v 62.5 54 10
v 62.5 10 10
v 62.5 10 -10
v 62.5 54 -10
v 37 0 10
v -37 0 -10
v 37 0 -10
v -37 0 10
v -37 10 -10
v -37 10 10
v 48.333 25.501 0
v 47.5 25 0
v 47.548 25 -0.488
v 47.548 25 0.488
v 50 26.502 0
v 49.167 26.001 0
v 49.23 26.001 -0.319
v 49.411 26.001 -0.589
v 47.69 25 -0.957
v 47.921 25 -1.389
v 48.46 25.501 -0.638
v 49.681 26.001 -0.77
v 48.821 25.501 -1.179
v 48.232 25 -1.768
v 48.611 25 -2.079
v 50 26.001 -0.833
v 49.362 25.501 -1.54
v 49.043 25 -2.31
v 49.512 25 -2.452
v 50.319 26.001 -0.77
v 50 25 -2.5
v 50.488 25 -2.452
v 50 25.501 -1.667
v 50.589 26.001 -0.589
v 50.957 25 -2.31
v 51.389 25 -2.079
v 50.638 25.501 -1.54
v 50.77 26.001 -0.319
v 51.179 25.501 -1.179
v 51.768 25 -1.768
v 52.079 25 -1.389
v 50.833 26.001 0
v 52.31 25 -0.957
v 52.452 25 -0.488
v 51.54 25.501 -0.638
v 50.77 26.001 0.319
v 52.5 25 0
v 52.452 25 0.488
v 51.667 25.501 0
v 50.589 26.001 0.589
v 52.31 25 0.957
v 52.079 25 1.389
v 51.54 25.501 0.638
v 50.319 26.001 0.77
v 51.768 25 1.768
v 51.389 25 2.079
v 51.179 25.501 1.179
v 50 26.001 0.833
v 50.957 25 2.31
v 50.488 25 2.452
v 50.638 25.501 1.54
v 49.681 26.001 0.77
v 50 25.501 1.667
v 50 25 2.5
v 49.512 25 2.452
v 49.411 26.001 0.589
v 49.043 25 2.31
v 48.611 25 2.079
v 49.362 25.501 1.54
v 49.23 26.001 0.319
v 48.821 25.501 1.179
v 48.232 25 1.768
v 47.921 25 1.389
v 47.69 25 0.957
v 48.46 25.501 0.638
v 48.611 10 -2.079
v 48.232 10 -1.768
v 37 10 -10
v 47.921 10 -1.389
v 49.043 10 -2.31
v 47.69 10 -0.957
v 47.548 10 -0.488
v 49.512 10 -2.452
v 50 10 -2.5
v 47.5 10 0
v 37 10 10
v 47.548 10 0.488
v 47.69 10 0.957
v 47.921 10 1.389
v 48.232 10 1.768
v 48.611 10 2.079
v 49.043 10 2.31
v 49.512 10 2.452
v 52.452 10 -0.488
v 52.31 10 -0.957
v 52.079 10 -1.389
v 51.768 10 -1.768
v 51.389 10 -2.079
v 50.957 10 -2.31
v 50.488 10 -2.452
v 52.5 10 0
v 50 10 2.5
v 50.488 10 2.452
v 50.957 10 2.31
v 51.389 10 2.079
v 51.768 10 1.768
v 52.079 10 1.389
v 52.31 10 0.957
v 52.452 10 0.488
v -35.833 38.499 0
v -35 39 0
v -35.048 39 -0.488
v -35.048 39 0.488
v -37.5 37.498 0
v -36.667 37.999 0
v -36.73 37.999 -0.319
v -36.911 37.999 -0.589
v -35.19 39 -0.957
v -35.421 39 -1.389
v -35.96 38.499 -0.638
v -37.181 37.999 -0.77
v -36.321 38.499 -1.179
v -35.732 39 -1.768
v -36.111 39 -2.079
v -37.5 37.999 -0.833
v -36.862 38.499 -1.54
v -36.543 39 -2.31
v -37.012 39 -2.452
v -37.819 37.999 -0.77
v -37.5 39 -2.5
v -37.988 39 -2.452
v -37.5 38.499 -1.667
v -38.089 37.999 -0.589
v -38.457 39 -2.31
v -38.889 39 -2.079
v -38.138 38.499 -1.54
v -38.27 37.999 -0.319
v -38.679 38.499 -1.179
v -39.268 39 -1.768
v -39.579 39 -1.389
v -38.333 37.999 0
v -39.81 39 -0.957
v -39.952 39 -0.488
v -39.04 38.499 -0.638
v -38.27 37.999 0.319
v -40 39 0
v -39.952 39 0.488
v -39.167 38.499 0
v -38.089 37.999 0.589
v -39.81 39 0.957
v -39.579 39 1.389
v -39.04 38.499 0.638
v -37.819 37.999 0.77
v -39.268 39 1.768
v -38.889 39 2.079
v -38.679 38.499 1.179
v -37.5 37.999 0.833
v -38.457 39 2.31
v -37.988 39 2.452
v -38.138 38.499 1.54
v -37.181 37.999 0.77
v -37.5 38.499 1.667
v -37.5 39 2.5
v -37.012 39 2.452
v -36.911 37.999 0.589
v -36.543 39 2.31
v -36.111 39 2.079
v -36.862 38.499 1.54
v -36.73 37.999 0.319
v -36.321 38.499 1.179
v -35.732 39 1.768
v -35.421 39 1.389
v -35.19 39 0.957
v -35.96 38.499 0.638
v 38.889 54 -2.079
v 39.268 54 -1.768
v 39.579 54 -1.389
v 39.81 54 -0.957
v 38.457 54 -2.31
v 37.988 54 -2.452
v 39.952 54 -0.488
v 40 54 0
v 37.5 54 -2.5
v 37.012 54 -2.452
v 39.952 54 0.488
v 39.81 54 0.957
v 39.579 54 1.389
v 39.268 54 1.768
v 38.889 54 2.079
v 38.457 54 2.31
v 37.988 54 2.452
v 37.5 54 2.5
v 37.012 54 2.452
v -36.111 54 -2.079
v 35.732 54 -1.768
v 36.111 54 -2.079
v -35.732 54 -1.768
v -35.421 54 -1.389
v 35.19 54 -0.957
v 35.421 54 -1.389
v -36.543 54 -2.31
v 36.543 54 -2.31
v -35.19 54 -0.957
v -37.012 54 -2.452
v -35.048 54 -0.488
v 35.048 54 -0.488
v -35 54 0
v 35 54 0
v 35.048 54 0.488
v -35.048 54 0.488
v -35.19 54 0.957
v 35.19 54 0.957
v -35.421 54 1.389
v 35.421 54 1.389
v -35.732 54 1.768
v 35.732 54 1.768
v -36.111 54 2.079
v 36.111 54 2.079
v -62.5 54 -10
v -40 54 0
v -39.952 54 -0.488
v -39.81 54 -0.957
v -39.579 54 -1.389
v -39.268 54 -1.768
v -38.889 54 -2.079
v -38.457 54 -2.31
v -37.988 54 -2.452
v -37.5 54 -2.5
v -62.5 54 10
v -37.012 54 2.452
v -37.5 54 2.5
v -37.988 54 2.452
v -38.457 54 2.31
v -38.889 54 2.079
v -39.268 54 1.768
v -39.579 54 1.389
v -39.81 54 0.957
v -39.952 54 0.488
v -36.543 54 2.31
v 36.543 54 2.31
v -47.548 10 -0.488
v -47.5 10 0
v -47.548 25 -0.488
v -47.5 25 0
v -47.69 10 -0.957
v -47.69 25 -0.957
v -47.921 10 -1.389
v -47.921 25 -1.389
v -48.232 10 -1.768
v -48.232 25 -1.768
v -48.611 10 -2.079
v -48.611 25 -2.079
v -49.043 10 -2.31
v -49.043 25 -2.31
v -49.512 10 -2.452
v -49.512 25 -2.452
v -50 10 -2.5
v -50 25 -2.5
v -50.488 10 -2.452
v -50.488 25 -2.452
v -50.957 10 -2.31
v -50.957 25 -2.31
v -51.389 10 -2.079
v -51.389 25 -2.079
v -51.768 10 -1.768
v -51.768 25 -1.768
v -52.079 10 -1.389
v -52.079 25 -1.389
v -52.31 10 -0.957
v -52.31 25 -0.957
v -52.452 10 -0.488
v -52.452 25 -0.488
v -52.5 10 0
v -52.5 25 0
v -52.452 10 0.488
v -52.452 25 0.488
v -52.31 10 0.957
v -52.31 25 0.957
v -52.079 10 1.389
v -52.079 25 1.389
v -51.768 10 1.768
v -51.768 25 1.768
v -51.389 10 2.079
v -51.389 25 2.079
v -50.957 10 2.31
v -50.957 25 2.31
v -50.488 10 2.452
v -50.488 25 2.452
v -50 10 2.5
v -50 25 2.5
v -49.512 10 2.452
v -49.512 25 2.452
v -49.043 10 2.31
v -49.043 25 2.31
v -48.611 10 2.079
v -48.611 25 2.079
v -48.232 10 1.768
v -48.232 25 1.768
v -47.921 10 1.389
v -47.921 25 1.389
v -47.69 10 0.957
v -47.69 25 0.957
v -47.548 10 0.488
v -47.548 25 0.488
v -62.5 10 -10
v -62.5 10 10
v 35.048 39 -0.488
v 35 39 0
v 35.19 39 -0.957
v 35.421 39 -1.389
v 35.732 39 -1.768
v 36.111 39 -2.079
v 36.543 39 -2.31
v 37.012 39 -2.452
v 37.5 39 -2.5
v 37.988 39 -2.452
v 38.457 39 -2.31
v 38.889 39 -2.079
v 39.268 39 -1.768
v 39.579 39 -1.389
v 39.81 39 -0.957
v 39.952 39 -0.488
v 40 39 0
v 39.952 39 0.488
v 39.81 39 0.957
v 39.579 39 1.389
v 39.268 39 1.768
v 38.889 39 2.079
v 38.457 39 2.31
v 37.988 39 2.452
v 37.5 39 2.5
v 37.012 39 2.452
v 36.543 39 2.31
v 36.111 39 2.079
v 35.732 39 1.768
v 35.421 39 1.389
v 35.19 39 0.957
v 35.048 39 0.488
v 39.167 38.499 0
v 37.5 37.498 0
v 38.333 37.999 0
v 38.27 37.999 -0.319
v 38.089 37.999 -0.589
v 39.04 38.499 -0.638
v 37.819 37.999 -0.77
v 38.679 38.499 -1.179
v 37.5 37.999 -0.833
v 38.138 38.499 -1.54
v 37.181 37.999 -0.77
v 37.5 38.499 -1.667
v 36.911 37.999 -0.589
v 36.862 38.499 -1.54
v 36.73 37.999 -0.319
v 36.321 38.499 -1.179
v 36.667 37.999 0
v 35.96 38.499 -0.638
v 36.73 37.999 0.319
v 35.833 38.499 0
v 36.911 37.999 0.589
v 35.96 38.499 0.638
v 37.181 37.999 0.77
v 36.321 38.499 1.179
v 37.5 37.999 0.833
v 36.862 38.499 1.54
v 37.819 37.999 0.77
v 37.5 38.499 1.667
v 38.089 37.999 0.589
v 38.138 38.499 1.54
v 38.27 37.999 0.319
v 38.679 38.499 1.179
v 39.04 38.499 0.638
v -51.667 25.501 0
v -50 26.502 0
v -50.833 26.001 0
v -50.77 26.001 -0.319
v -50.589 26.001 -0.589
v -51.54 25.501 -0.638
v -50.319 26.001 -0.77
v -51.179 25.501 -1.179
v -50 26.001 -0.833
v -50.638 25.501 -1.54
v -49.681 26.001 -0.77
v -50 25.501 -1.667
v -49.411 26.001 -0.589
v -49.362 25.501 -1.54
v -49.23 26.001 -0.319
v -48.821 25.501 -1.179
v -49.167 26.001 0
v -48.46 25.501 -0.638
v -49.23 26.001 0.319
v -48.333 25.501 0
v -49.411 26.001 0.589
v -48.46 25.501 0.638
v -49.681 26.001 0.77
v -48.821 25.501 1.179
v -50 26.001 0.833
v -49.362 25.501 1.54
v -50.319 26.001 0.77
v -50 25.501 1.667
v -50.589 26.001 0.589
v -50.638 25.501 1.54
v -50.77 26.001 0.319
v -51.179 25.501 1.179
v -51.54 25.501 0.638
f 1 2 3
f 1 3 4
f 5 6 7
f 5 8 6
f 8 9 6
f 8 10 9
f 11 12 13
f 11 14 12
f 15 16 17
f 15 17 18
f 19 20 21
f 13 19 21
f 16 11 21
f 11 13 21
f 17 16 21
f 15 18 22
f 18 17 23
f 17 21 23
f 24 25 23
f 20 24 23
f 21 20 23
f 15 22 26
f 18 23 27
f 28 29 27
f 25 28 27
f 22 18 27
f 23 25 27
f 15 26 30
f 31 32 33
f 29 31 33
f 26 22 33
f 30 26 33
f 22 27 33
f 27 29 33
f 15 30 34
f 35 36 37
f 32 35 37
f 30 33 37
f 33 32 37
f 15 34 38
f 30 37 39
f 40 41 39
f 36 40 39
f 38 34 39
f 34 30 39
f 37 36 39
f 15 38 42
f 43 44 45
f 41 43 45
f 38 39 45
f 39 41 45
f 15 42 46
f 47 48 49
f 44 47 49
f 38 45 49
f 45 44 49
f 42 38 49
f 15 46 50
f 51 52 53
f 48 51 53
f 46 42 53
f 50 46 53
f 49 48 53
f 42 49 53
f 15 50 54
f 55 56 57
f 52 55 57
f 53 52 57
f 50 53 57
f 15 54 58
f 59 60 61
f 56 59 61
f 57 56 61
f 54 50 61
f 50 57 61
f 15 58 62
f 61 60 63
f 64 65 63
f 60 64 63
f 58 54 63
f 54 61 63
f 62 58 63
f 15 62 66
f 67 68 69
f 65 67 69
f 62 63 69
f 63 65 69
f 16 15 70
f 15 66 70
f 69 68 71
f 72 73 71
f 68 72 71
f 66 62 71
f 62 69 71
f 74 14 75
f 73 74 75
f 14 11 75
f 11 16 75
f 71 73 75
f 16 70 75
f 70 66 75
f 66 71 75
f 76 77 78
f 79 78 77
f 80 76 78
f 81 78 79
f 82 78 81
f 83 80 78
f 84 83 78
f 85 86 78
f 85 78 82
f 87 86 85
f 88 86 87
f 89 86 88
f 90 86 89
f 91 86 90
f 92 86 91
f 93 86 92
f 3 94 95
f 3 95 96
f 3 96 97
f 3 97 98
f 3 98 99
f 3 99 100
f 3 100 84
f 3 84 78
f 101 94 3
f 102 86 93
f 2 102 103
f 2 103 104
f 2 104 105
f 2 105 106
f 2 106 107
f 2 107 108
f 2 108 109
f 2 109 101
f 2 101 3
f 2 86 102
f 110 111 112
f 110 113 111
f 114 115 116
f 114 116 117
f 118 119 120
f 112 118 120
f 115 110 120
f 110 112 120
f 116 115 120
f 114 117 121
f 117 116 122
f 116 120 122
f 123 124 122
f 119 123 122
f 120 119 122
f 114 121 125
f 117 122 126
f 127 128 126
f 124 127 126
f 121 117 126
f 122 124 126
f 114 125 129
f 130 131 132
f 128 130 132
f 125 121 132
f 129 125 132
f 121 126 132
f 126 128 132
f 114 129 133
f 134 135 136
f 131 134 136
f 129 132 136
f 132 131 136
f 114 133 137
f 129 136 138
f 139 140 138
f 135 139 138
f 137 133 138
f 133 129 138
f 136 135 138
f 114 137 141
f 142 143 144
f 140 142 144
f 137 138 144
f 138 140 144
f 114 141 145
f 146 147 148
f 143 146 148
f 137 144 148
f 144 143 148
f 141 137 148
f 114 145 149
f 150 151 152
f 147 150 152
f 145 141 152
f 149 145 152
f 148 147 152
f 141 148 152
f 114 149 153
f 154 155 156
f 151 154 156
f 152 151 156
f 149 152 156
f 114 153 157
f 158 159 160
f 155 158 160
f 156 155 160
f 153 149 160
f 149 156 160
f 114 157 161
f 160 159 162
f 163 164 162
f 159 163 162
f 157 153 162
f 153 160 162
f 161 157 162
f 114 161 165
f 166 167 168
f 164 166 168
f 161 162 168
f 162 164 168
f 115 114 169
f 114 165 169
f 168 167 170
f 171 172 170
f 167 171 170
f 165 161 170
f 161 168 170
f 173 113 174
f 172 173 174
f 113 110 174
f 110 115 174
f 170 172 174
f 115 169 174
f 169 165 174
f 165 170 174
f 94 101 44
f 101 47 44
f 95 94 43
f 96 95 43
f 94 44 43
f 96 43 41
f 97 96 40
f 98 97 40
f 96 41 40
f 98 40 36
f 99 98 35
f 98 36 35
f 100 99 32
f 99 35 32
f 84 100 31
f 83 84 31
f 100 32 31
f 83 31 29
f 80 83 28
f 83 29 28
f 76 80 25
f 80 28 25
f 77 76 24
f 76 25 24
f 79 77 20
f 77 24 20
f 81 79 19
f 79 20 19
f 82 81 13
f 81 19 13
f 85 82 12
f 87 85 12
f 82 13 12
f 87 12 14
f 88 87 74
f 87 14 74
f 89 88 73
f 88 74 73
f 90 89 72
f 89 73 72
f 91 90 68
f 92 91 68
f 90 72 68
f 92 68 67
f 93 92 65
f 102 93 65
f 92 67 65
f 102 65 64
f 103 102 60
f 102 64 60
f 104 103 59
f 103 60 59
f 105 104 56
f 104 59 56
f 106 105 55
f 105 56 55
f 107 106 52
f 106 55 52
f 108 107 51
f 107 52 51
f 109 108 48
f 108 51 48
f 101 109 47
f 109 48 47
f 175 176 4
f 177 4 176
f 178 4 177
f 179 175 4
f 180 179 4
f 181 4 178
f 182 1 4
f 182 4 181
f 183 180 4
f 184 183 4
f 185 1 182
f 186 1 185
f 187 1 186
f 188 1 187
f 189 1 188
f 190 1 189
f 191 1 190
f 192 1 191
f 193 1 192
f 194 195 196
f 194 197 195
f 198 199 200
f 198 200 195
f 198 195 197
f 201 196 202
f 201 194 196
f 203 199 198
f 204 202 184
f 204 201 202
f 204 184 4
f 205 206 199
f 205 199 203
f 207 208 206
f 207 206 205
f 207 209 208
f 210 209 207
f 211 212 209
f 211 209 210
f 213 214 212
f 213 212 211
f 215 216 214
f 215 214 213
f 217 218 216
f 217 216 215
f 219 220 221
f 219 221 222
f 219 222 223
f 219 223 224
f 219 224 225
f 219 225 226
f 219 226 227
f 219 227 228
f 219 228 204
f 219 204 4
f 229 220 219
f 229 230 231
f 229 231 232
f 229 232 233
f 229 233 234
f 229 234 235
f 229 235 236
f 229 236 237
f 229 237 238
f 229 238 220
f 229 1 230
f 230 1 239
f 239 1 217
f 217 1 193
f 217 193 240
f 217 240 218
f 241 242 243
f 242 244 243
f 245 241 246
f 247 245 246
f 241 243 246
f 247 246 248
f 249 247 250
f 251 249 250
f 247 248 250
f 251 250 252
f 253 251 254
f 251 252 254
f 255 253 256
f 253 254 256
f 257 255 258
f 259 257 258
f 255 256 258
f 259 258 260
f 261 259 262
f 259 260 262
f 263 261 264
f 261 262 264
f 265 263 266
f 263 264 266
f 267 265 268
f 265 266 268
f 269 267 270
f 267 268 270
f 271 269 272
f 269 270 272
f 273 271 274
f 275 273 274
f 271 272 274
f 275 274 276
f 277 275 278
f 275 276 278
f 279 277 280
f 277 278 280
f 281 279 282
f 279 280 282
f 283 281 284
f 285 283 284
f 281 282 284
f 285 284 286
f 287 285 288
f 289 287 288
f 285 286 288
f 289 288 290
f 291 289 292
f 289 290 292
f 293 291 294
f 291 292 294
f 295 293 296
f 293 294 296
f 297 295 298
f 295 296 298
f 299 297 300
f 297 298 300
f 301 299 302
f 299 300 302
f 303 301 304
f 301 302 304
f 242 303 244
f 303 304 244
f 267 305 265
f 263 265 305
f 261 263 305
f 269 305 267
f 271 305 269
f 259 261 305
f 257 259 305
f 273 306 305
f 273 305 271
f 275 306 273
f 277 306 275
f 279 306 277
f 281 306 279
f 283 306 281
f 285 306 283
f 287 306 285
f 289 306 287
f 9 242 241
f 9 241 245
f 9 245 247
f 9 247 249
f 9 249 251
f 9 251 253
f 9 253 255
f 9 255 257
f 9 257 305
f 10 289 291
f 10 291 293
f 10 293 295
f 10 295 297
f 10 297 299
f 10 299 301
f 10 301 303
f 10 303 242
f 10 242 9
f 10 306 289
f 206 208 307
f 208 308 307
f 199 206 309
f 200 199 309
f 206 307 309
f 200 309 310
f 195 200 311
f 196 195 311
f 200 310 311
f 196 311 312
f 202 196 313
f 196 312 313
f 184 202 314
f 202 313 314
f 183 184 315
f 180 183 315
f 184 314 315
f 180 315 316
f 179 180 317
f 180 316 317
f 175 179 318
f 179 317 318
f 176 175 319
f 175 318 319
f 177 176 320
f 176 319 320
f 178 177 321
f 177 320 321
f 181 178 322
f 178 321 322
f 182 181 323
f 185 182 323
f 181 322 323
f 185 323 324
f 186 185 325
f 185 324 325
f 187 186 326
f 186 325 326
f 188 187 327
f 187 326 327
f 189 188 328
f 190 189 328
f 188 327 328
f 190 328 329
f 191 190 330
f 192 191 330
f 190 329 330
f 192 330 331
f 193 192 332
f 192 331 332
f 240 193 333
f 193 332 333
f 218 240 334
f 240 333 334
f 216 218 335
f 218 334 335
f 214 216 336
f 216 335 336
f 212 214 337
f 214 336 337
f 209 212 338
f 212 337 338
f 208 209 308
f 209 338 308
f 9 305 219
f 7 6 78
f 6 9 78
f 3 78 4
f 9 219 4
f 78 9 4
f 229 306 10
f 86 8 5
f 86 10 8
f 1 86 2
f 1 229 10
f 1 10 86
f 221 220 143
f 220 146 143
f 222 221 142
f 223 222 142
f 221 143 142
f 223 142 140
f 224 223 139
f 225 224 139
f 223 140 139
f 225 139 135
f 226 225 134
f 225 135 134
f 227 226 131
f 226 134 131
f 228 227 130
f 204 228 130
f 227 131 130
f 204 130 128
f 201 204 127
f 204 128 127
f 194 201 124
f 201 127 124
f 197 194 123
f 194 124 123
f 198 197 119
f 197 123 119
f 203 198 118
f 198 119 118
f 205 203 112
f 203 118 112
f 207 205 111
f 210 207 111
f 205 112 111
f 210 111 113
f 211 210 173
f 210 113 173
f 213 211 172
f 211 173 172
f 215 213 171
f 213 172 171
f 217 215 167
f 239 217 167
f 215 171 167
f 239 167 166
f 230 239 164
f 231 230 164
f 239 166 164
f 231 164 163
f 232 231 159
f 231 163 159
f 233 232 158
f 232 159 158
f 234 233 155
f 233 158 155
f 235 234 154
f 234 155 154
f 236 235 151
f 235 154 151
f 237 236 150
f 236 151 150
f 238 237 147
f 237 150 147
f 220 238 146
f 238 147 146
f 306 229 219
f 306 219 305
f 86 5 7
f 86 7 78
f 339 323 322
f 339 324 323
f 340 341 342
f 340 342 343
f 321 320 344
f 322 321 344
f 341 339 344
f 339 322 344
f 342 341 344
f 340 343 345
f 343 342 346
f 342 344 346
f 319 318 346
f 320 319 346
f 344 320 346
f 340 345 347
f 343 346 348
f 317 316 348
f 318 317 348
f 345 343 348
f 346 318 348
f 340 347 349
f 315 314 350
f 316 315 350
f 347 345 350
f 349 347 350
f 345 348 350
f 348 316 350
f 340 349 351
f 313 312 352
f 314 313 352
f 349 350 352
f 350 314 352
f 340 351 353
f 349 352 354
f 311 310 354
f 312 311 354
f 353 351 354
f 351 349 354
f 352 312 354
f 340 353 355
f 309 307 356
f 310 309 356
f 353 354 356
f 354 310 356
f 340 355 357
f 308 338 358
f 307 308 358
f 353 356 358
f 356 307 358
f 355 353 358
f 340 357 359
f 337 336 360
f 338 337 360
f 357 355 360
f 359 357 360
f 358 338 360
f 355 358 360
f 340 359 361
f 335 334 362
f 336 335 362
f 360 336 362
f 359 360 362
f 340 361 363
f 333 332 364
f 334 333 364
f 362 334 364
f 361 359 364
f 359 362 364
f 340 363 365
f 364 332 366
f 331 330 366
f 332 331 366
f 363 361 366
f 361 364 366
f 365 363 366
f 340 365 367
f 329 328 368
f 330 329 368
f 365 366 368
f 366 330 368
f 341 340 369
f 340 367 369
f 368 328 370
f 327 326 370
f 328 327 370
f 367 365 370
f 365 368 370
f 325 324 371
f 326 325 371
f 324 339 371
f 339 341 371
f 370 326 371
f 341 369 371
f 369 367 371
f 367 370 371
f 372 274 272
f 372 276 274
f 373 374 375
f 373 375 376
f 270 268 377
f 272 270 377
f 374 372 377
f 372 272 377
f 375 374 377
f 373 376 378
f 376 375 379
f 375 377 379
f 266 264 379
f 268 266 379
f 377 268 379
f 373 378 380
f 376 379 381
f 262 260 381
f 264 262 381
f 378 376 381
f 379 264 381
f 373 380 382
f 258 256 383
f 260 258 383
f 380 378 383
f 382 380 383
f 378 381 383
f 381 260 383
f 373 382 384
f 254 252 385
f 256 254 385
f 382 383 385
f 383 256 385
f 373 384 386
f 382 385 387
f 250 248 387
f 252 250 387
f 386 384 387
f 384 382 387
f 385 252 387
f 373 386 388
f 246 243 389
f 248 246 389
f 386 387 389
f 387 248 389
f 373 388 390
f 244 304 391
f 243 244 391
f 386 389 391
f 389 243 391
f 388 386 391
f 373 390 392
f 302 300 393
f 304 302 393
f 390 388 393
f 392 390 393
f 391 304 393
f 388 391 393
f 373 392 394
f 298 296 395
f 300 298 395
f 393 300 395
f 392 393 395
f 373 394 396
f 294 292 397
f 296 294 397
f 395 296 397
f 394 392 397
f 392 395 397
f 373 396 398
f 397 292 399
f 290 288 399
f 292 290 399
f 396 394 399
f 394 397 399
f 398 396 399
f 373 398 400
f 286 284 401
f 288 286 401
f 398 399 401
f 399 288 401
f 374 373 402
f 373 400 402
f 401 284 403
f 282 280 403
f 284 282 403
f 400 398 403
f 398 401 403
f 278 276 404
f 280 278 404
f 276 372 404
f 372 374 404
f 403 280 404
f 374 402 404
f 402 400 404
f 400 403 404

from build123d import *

# Parameters (mm, degrees)
BOSS_EXTRUDE1_DEPTH   = 10
M6_TAPPED_HOLE1_D     = 5
M6_TAPPED_HOLE1_DEPTH = 15
M6_TAPPED_HOLE1_TIP   = 1.502151548
M6_TAPPED_HOLE2_D     = 5
M6_TAPPED_HOLE2_DEPTH = 15
M6_TAPPED_HOLE2_TIP   = 1.502151548


with BuildPart() as part:
    # Sketch1 → Boss-Extrude1 (new body, symmetric)
    with BuildSketch(Plane.XY):
        Polygon((-37, 0), (37, 0), (37, 10), (62.5, 10), (62.5, 54), (-62.5, 54), (-62.5, 10), (-37, 10), align=None)
    extrude(amount=BOSS_EXTRUDE1_DEPTH, both=True)

    # M6 Tapped Hole1
    with Locations(Plane(origin=(0, 10, 0), x_dir=(-1, 0, 0), z_dir=(0, -1, 0))):
        with Locations((50, 0), (-50, 0)):
            Hole(M6_TAPPED_HOLE1_D / 2, depth=M6_TAPPED_HOLE1_DEPTH)
            with Locations((0, 0, -(M6_TAPPED_HOLE1_DEPTH + M6_TAPPED_HOLE1_TIP / 2))):  # 118° drill point
                Cone(0, M6_TAPPED_HOLE1_D / 2, M6_TAPPED_HOLE1_TIP, mode=Mode.SUBTRACT)

    # M6 Tapped Hole2
    with Locations(Plane(origin=(0, 54, 0), x_dir=(1, 0, 0), z_dir=(0, 1, 0))):
        with Locations((-37.5, 0), (37.5, 0)):
            Hole(M6_TAPPED_HOLE2_D / 2, depth=M6_TAPPED_HOLE2_DEPTH)
            with Locations((0, 0, -(M6_TAPPED_HOLE2_DEPTH + M6_TAPPED_HOLE2_TIP / 2))):  # 118° drill point
                Cone(0, M6_TAPPED_HOLE2_D / 2, M6_TAPPED_HOLE2_TIP, mode=Mode.SUBTRACT)


solid = part.part
